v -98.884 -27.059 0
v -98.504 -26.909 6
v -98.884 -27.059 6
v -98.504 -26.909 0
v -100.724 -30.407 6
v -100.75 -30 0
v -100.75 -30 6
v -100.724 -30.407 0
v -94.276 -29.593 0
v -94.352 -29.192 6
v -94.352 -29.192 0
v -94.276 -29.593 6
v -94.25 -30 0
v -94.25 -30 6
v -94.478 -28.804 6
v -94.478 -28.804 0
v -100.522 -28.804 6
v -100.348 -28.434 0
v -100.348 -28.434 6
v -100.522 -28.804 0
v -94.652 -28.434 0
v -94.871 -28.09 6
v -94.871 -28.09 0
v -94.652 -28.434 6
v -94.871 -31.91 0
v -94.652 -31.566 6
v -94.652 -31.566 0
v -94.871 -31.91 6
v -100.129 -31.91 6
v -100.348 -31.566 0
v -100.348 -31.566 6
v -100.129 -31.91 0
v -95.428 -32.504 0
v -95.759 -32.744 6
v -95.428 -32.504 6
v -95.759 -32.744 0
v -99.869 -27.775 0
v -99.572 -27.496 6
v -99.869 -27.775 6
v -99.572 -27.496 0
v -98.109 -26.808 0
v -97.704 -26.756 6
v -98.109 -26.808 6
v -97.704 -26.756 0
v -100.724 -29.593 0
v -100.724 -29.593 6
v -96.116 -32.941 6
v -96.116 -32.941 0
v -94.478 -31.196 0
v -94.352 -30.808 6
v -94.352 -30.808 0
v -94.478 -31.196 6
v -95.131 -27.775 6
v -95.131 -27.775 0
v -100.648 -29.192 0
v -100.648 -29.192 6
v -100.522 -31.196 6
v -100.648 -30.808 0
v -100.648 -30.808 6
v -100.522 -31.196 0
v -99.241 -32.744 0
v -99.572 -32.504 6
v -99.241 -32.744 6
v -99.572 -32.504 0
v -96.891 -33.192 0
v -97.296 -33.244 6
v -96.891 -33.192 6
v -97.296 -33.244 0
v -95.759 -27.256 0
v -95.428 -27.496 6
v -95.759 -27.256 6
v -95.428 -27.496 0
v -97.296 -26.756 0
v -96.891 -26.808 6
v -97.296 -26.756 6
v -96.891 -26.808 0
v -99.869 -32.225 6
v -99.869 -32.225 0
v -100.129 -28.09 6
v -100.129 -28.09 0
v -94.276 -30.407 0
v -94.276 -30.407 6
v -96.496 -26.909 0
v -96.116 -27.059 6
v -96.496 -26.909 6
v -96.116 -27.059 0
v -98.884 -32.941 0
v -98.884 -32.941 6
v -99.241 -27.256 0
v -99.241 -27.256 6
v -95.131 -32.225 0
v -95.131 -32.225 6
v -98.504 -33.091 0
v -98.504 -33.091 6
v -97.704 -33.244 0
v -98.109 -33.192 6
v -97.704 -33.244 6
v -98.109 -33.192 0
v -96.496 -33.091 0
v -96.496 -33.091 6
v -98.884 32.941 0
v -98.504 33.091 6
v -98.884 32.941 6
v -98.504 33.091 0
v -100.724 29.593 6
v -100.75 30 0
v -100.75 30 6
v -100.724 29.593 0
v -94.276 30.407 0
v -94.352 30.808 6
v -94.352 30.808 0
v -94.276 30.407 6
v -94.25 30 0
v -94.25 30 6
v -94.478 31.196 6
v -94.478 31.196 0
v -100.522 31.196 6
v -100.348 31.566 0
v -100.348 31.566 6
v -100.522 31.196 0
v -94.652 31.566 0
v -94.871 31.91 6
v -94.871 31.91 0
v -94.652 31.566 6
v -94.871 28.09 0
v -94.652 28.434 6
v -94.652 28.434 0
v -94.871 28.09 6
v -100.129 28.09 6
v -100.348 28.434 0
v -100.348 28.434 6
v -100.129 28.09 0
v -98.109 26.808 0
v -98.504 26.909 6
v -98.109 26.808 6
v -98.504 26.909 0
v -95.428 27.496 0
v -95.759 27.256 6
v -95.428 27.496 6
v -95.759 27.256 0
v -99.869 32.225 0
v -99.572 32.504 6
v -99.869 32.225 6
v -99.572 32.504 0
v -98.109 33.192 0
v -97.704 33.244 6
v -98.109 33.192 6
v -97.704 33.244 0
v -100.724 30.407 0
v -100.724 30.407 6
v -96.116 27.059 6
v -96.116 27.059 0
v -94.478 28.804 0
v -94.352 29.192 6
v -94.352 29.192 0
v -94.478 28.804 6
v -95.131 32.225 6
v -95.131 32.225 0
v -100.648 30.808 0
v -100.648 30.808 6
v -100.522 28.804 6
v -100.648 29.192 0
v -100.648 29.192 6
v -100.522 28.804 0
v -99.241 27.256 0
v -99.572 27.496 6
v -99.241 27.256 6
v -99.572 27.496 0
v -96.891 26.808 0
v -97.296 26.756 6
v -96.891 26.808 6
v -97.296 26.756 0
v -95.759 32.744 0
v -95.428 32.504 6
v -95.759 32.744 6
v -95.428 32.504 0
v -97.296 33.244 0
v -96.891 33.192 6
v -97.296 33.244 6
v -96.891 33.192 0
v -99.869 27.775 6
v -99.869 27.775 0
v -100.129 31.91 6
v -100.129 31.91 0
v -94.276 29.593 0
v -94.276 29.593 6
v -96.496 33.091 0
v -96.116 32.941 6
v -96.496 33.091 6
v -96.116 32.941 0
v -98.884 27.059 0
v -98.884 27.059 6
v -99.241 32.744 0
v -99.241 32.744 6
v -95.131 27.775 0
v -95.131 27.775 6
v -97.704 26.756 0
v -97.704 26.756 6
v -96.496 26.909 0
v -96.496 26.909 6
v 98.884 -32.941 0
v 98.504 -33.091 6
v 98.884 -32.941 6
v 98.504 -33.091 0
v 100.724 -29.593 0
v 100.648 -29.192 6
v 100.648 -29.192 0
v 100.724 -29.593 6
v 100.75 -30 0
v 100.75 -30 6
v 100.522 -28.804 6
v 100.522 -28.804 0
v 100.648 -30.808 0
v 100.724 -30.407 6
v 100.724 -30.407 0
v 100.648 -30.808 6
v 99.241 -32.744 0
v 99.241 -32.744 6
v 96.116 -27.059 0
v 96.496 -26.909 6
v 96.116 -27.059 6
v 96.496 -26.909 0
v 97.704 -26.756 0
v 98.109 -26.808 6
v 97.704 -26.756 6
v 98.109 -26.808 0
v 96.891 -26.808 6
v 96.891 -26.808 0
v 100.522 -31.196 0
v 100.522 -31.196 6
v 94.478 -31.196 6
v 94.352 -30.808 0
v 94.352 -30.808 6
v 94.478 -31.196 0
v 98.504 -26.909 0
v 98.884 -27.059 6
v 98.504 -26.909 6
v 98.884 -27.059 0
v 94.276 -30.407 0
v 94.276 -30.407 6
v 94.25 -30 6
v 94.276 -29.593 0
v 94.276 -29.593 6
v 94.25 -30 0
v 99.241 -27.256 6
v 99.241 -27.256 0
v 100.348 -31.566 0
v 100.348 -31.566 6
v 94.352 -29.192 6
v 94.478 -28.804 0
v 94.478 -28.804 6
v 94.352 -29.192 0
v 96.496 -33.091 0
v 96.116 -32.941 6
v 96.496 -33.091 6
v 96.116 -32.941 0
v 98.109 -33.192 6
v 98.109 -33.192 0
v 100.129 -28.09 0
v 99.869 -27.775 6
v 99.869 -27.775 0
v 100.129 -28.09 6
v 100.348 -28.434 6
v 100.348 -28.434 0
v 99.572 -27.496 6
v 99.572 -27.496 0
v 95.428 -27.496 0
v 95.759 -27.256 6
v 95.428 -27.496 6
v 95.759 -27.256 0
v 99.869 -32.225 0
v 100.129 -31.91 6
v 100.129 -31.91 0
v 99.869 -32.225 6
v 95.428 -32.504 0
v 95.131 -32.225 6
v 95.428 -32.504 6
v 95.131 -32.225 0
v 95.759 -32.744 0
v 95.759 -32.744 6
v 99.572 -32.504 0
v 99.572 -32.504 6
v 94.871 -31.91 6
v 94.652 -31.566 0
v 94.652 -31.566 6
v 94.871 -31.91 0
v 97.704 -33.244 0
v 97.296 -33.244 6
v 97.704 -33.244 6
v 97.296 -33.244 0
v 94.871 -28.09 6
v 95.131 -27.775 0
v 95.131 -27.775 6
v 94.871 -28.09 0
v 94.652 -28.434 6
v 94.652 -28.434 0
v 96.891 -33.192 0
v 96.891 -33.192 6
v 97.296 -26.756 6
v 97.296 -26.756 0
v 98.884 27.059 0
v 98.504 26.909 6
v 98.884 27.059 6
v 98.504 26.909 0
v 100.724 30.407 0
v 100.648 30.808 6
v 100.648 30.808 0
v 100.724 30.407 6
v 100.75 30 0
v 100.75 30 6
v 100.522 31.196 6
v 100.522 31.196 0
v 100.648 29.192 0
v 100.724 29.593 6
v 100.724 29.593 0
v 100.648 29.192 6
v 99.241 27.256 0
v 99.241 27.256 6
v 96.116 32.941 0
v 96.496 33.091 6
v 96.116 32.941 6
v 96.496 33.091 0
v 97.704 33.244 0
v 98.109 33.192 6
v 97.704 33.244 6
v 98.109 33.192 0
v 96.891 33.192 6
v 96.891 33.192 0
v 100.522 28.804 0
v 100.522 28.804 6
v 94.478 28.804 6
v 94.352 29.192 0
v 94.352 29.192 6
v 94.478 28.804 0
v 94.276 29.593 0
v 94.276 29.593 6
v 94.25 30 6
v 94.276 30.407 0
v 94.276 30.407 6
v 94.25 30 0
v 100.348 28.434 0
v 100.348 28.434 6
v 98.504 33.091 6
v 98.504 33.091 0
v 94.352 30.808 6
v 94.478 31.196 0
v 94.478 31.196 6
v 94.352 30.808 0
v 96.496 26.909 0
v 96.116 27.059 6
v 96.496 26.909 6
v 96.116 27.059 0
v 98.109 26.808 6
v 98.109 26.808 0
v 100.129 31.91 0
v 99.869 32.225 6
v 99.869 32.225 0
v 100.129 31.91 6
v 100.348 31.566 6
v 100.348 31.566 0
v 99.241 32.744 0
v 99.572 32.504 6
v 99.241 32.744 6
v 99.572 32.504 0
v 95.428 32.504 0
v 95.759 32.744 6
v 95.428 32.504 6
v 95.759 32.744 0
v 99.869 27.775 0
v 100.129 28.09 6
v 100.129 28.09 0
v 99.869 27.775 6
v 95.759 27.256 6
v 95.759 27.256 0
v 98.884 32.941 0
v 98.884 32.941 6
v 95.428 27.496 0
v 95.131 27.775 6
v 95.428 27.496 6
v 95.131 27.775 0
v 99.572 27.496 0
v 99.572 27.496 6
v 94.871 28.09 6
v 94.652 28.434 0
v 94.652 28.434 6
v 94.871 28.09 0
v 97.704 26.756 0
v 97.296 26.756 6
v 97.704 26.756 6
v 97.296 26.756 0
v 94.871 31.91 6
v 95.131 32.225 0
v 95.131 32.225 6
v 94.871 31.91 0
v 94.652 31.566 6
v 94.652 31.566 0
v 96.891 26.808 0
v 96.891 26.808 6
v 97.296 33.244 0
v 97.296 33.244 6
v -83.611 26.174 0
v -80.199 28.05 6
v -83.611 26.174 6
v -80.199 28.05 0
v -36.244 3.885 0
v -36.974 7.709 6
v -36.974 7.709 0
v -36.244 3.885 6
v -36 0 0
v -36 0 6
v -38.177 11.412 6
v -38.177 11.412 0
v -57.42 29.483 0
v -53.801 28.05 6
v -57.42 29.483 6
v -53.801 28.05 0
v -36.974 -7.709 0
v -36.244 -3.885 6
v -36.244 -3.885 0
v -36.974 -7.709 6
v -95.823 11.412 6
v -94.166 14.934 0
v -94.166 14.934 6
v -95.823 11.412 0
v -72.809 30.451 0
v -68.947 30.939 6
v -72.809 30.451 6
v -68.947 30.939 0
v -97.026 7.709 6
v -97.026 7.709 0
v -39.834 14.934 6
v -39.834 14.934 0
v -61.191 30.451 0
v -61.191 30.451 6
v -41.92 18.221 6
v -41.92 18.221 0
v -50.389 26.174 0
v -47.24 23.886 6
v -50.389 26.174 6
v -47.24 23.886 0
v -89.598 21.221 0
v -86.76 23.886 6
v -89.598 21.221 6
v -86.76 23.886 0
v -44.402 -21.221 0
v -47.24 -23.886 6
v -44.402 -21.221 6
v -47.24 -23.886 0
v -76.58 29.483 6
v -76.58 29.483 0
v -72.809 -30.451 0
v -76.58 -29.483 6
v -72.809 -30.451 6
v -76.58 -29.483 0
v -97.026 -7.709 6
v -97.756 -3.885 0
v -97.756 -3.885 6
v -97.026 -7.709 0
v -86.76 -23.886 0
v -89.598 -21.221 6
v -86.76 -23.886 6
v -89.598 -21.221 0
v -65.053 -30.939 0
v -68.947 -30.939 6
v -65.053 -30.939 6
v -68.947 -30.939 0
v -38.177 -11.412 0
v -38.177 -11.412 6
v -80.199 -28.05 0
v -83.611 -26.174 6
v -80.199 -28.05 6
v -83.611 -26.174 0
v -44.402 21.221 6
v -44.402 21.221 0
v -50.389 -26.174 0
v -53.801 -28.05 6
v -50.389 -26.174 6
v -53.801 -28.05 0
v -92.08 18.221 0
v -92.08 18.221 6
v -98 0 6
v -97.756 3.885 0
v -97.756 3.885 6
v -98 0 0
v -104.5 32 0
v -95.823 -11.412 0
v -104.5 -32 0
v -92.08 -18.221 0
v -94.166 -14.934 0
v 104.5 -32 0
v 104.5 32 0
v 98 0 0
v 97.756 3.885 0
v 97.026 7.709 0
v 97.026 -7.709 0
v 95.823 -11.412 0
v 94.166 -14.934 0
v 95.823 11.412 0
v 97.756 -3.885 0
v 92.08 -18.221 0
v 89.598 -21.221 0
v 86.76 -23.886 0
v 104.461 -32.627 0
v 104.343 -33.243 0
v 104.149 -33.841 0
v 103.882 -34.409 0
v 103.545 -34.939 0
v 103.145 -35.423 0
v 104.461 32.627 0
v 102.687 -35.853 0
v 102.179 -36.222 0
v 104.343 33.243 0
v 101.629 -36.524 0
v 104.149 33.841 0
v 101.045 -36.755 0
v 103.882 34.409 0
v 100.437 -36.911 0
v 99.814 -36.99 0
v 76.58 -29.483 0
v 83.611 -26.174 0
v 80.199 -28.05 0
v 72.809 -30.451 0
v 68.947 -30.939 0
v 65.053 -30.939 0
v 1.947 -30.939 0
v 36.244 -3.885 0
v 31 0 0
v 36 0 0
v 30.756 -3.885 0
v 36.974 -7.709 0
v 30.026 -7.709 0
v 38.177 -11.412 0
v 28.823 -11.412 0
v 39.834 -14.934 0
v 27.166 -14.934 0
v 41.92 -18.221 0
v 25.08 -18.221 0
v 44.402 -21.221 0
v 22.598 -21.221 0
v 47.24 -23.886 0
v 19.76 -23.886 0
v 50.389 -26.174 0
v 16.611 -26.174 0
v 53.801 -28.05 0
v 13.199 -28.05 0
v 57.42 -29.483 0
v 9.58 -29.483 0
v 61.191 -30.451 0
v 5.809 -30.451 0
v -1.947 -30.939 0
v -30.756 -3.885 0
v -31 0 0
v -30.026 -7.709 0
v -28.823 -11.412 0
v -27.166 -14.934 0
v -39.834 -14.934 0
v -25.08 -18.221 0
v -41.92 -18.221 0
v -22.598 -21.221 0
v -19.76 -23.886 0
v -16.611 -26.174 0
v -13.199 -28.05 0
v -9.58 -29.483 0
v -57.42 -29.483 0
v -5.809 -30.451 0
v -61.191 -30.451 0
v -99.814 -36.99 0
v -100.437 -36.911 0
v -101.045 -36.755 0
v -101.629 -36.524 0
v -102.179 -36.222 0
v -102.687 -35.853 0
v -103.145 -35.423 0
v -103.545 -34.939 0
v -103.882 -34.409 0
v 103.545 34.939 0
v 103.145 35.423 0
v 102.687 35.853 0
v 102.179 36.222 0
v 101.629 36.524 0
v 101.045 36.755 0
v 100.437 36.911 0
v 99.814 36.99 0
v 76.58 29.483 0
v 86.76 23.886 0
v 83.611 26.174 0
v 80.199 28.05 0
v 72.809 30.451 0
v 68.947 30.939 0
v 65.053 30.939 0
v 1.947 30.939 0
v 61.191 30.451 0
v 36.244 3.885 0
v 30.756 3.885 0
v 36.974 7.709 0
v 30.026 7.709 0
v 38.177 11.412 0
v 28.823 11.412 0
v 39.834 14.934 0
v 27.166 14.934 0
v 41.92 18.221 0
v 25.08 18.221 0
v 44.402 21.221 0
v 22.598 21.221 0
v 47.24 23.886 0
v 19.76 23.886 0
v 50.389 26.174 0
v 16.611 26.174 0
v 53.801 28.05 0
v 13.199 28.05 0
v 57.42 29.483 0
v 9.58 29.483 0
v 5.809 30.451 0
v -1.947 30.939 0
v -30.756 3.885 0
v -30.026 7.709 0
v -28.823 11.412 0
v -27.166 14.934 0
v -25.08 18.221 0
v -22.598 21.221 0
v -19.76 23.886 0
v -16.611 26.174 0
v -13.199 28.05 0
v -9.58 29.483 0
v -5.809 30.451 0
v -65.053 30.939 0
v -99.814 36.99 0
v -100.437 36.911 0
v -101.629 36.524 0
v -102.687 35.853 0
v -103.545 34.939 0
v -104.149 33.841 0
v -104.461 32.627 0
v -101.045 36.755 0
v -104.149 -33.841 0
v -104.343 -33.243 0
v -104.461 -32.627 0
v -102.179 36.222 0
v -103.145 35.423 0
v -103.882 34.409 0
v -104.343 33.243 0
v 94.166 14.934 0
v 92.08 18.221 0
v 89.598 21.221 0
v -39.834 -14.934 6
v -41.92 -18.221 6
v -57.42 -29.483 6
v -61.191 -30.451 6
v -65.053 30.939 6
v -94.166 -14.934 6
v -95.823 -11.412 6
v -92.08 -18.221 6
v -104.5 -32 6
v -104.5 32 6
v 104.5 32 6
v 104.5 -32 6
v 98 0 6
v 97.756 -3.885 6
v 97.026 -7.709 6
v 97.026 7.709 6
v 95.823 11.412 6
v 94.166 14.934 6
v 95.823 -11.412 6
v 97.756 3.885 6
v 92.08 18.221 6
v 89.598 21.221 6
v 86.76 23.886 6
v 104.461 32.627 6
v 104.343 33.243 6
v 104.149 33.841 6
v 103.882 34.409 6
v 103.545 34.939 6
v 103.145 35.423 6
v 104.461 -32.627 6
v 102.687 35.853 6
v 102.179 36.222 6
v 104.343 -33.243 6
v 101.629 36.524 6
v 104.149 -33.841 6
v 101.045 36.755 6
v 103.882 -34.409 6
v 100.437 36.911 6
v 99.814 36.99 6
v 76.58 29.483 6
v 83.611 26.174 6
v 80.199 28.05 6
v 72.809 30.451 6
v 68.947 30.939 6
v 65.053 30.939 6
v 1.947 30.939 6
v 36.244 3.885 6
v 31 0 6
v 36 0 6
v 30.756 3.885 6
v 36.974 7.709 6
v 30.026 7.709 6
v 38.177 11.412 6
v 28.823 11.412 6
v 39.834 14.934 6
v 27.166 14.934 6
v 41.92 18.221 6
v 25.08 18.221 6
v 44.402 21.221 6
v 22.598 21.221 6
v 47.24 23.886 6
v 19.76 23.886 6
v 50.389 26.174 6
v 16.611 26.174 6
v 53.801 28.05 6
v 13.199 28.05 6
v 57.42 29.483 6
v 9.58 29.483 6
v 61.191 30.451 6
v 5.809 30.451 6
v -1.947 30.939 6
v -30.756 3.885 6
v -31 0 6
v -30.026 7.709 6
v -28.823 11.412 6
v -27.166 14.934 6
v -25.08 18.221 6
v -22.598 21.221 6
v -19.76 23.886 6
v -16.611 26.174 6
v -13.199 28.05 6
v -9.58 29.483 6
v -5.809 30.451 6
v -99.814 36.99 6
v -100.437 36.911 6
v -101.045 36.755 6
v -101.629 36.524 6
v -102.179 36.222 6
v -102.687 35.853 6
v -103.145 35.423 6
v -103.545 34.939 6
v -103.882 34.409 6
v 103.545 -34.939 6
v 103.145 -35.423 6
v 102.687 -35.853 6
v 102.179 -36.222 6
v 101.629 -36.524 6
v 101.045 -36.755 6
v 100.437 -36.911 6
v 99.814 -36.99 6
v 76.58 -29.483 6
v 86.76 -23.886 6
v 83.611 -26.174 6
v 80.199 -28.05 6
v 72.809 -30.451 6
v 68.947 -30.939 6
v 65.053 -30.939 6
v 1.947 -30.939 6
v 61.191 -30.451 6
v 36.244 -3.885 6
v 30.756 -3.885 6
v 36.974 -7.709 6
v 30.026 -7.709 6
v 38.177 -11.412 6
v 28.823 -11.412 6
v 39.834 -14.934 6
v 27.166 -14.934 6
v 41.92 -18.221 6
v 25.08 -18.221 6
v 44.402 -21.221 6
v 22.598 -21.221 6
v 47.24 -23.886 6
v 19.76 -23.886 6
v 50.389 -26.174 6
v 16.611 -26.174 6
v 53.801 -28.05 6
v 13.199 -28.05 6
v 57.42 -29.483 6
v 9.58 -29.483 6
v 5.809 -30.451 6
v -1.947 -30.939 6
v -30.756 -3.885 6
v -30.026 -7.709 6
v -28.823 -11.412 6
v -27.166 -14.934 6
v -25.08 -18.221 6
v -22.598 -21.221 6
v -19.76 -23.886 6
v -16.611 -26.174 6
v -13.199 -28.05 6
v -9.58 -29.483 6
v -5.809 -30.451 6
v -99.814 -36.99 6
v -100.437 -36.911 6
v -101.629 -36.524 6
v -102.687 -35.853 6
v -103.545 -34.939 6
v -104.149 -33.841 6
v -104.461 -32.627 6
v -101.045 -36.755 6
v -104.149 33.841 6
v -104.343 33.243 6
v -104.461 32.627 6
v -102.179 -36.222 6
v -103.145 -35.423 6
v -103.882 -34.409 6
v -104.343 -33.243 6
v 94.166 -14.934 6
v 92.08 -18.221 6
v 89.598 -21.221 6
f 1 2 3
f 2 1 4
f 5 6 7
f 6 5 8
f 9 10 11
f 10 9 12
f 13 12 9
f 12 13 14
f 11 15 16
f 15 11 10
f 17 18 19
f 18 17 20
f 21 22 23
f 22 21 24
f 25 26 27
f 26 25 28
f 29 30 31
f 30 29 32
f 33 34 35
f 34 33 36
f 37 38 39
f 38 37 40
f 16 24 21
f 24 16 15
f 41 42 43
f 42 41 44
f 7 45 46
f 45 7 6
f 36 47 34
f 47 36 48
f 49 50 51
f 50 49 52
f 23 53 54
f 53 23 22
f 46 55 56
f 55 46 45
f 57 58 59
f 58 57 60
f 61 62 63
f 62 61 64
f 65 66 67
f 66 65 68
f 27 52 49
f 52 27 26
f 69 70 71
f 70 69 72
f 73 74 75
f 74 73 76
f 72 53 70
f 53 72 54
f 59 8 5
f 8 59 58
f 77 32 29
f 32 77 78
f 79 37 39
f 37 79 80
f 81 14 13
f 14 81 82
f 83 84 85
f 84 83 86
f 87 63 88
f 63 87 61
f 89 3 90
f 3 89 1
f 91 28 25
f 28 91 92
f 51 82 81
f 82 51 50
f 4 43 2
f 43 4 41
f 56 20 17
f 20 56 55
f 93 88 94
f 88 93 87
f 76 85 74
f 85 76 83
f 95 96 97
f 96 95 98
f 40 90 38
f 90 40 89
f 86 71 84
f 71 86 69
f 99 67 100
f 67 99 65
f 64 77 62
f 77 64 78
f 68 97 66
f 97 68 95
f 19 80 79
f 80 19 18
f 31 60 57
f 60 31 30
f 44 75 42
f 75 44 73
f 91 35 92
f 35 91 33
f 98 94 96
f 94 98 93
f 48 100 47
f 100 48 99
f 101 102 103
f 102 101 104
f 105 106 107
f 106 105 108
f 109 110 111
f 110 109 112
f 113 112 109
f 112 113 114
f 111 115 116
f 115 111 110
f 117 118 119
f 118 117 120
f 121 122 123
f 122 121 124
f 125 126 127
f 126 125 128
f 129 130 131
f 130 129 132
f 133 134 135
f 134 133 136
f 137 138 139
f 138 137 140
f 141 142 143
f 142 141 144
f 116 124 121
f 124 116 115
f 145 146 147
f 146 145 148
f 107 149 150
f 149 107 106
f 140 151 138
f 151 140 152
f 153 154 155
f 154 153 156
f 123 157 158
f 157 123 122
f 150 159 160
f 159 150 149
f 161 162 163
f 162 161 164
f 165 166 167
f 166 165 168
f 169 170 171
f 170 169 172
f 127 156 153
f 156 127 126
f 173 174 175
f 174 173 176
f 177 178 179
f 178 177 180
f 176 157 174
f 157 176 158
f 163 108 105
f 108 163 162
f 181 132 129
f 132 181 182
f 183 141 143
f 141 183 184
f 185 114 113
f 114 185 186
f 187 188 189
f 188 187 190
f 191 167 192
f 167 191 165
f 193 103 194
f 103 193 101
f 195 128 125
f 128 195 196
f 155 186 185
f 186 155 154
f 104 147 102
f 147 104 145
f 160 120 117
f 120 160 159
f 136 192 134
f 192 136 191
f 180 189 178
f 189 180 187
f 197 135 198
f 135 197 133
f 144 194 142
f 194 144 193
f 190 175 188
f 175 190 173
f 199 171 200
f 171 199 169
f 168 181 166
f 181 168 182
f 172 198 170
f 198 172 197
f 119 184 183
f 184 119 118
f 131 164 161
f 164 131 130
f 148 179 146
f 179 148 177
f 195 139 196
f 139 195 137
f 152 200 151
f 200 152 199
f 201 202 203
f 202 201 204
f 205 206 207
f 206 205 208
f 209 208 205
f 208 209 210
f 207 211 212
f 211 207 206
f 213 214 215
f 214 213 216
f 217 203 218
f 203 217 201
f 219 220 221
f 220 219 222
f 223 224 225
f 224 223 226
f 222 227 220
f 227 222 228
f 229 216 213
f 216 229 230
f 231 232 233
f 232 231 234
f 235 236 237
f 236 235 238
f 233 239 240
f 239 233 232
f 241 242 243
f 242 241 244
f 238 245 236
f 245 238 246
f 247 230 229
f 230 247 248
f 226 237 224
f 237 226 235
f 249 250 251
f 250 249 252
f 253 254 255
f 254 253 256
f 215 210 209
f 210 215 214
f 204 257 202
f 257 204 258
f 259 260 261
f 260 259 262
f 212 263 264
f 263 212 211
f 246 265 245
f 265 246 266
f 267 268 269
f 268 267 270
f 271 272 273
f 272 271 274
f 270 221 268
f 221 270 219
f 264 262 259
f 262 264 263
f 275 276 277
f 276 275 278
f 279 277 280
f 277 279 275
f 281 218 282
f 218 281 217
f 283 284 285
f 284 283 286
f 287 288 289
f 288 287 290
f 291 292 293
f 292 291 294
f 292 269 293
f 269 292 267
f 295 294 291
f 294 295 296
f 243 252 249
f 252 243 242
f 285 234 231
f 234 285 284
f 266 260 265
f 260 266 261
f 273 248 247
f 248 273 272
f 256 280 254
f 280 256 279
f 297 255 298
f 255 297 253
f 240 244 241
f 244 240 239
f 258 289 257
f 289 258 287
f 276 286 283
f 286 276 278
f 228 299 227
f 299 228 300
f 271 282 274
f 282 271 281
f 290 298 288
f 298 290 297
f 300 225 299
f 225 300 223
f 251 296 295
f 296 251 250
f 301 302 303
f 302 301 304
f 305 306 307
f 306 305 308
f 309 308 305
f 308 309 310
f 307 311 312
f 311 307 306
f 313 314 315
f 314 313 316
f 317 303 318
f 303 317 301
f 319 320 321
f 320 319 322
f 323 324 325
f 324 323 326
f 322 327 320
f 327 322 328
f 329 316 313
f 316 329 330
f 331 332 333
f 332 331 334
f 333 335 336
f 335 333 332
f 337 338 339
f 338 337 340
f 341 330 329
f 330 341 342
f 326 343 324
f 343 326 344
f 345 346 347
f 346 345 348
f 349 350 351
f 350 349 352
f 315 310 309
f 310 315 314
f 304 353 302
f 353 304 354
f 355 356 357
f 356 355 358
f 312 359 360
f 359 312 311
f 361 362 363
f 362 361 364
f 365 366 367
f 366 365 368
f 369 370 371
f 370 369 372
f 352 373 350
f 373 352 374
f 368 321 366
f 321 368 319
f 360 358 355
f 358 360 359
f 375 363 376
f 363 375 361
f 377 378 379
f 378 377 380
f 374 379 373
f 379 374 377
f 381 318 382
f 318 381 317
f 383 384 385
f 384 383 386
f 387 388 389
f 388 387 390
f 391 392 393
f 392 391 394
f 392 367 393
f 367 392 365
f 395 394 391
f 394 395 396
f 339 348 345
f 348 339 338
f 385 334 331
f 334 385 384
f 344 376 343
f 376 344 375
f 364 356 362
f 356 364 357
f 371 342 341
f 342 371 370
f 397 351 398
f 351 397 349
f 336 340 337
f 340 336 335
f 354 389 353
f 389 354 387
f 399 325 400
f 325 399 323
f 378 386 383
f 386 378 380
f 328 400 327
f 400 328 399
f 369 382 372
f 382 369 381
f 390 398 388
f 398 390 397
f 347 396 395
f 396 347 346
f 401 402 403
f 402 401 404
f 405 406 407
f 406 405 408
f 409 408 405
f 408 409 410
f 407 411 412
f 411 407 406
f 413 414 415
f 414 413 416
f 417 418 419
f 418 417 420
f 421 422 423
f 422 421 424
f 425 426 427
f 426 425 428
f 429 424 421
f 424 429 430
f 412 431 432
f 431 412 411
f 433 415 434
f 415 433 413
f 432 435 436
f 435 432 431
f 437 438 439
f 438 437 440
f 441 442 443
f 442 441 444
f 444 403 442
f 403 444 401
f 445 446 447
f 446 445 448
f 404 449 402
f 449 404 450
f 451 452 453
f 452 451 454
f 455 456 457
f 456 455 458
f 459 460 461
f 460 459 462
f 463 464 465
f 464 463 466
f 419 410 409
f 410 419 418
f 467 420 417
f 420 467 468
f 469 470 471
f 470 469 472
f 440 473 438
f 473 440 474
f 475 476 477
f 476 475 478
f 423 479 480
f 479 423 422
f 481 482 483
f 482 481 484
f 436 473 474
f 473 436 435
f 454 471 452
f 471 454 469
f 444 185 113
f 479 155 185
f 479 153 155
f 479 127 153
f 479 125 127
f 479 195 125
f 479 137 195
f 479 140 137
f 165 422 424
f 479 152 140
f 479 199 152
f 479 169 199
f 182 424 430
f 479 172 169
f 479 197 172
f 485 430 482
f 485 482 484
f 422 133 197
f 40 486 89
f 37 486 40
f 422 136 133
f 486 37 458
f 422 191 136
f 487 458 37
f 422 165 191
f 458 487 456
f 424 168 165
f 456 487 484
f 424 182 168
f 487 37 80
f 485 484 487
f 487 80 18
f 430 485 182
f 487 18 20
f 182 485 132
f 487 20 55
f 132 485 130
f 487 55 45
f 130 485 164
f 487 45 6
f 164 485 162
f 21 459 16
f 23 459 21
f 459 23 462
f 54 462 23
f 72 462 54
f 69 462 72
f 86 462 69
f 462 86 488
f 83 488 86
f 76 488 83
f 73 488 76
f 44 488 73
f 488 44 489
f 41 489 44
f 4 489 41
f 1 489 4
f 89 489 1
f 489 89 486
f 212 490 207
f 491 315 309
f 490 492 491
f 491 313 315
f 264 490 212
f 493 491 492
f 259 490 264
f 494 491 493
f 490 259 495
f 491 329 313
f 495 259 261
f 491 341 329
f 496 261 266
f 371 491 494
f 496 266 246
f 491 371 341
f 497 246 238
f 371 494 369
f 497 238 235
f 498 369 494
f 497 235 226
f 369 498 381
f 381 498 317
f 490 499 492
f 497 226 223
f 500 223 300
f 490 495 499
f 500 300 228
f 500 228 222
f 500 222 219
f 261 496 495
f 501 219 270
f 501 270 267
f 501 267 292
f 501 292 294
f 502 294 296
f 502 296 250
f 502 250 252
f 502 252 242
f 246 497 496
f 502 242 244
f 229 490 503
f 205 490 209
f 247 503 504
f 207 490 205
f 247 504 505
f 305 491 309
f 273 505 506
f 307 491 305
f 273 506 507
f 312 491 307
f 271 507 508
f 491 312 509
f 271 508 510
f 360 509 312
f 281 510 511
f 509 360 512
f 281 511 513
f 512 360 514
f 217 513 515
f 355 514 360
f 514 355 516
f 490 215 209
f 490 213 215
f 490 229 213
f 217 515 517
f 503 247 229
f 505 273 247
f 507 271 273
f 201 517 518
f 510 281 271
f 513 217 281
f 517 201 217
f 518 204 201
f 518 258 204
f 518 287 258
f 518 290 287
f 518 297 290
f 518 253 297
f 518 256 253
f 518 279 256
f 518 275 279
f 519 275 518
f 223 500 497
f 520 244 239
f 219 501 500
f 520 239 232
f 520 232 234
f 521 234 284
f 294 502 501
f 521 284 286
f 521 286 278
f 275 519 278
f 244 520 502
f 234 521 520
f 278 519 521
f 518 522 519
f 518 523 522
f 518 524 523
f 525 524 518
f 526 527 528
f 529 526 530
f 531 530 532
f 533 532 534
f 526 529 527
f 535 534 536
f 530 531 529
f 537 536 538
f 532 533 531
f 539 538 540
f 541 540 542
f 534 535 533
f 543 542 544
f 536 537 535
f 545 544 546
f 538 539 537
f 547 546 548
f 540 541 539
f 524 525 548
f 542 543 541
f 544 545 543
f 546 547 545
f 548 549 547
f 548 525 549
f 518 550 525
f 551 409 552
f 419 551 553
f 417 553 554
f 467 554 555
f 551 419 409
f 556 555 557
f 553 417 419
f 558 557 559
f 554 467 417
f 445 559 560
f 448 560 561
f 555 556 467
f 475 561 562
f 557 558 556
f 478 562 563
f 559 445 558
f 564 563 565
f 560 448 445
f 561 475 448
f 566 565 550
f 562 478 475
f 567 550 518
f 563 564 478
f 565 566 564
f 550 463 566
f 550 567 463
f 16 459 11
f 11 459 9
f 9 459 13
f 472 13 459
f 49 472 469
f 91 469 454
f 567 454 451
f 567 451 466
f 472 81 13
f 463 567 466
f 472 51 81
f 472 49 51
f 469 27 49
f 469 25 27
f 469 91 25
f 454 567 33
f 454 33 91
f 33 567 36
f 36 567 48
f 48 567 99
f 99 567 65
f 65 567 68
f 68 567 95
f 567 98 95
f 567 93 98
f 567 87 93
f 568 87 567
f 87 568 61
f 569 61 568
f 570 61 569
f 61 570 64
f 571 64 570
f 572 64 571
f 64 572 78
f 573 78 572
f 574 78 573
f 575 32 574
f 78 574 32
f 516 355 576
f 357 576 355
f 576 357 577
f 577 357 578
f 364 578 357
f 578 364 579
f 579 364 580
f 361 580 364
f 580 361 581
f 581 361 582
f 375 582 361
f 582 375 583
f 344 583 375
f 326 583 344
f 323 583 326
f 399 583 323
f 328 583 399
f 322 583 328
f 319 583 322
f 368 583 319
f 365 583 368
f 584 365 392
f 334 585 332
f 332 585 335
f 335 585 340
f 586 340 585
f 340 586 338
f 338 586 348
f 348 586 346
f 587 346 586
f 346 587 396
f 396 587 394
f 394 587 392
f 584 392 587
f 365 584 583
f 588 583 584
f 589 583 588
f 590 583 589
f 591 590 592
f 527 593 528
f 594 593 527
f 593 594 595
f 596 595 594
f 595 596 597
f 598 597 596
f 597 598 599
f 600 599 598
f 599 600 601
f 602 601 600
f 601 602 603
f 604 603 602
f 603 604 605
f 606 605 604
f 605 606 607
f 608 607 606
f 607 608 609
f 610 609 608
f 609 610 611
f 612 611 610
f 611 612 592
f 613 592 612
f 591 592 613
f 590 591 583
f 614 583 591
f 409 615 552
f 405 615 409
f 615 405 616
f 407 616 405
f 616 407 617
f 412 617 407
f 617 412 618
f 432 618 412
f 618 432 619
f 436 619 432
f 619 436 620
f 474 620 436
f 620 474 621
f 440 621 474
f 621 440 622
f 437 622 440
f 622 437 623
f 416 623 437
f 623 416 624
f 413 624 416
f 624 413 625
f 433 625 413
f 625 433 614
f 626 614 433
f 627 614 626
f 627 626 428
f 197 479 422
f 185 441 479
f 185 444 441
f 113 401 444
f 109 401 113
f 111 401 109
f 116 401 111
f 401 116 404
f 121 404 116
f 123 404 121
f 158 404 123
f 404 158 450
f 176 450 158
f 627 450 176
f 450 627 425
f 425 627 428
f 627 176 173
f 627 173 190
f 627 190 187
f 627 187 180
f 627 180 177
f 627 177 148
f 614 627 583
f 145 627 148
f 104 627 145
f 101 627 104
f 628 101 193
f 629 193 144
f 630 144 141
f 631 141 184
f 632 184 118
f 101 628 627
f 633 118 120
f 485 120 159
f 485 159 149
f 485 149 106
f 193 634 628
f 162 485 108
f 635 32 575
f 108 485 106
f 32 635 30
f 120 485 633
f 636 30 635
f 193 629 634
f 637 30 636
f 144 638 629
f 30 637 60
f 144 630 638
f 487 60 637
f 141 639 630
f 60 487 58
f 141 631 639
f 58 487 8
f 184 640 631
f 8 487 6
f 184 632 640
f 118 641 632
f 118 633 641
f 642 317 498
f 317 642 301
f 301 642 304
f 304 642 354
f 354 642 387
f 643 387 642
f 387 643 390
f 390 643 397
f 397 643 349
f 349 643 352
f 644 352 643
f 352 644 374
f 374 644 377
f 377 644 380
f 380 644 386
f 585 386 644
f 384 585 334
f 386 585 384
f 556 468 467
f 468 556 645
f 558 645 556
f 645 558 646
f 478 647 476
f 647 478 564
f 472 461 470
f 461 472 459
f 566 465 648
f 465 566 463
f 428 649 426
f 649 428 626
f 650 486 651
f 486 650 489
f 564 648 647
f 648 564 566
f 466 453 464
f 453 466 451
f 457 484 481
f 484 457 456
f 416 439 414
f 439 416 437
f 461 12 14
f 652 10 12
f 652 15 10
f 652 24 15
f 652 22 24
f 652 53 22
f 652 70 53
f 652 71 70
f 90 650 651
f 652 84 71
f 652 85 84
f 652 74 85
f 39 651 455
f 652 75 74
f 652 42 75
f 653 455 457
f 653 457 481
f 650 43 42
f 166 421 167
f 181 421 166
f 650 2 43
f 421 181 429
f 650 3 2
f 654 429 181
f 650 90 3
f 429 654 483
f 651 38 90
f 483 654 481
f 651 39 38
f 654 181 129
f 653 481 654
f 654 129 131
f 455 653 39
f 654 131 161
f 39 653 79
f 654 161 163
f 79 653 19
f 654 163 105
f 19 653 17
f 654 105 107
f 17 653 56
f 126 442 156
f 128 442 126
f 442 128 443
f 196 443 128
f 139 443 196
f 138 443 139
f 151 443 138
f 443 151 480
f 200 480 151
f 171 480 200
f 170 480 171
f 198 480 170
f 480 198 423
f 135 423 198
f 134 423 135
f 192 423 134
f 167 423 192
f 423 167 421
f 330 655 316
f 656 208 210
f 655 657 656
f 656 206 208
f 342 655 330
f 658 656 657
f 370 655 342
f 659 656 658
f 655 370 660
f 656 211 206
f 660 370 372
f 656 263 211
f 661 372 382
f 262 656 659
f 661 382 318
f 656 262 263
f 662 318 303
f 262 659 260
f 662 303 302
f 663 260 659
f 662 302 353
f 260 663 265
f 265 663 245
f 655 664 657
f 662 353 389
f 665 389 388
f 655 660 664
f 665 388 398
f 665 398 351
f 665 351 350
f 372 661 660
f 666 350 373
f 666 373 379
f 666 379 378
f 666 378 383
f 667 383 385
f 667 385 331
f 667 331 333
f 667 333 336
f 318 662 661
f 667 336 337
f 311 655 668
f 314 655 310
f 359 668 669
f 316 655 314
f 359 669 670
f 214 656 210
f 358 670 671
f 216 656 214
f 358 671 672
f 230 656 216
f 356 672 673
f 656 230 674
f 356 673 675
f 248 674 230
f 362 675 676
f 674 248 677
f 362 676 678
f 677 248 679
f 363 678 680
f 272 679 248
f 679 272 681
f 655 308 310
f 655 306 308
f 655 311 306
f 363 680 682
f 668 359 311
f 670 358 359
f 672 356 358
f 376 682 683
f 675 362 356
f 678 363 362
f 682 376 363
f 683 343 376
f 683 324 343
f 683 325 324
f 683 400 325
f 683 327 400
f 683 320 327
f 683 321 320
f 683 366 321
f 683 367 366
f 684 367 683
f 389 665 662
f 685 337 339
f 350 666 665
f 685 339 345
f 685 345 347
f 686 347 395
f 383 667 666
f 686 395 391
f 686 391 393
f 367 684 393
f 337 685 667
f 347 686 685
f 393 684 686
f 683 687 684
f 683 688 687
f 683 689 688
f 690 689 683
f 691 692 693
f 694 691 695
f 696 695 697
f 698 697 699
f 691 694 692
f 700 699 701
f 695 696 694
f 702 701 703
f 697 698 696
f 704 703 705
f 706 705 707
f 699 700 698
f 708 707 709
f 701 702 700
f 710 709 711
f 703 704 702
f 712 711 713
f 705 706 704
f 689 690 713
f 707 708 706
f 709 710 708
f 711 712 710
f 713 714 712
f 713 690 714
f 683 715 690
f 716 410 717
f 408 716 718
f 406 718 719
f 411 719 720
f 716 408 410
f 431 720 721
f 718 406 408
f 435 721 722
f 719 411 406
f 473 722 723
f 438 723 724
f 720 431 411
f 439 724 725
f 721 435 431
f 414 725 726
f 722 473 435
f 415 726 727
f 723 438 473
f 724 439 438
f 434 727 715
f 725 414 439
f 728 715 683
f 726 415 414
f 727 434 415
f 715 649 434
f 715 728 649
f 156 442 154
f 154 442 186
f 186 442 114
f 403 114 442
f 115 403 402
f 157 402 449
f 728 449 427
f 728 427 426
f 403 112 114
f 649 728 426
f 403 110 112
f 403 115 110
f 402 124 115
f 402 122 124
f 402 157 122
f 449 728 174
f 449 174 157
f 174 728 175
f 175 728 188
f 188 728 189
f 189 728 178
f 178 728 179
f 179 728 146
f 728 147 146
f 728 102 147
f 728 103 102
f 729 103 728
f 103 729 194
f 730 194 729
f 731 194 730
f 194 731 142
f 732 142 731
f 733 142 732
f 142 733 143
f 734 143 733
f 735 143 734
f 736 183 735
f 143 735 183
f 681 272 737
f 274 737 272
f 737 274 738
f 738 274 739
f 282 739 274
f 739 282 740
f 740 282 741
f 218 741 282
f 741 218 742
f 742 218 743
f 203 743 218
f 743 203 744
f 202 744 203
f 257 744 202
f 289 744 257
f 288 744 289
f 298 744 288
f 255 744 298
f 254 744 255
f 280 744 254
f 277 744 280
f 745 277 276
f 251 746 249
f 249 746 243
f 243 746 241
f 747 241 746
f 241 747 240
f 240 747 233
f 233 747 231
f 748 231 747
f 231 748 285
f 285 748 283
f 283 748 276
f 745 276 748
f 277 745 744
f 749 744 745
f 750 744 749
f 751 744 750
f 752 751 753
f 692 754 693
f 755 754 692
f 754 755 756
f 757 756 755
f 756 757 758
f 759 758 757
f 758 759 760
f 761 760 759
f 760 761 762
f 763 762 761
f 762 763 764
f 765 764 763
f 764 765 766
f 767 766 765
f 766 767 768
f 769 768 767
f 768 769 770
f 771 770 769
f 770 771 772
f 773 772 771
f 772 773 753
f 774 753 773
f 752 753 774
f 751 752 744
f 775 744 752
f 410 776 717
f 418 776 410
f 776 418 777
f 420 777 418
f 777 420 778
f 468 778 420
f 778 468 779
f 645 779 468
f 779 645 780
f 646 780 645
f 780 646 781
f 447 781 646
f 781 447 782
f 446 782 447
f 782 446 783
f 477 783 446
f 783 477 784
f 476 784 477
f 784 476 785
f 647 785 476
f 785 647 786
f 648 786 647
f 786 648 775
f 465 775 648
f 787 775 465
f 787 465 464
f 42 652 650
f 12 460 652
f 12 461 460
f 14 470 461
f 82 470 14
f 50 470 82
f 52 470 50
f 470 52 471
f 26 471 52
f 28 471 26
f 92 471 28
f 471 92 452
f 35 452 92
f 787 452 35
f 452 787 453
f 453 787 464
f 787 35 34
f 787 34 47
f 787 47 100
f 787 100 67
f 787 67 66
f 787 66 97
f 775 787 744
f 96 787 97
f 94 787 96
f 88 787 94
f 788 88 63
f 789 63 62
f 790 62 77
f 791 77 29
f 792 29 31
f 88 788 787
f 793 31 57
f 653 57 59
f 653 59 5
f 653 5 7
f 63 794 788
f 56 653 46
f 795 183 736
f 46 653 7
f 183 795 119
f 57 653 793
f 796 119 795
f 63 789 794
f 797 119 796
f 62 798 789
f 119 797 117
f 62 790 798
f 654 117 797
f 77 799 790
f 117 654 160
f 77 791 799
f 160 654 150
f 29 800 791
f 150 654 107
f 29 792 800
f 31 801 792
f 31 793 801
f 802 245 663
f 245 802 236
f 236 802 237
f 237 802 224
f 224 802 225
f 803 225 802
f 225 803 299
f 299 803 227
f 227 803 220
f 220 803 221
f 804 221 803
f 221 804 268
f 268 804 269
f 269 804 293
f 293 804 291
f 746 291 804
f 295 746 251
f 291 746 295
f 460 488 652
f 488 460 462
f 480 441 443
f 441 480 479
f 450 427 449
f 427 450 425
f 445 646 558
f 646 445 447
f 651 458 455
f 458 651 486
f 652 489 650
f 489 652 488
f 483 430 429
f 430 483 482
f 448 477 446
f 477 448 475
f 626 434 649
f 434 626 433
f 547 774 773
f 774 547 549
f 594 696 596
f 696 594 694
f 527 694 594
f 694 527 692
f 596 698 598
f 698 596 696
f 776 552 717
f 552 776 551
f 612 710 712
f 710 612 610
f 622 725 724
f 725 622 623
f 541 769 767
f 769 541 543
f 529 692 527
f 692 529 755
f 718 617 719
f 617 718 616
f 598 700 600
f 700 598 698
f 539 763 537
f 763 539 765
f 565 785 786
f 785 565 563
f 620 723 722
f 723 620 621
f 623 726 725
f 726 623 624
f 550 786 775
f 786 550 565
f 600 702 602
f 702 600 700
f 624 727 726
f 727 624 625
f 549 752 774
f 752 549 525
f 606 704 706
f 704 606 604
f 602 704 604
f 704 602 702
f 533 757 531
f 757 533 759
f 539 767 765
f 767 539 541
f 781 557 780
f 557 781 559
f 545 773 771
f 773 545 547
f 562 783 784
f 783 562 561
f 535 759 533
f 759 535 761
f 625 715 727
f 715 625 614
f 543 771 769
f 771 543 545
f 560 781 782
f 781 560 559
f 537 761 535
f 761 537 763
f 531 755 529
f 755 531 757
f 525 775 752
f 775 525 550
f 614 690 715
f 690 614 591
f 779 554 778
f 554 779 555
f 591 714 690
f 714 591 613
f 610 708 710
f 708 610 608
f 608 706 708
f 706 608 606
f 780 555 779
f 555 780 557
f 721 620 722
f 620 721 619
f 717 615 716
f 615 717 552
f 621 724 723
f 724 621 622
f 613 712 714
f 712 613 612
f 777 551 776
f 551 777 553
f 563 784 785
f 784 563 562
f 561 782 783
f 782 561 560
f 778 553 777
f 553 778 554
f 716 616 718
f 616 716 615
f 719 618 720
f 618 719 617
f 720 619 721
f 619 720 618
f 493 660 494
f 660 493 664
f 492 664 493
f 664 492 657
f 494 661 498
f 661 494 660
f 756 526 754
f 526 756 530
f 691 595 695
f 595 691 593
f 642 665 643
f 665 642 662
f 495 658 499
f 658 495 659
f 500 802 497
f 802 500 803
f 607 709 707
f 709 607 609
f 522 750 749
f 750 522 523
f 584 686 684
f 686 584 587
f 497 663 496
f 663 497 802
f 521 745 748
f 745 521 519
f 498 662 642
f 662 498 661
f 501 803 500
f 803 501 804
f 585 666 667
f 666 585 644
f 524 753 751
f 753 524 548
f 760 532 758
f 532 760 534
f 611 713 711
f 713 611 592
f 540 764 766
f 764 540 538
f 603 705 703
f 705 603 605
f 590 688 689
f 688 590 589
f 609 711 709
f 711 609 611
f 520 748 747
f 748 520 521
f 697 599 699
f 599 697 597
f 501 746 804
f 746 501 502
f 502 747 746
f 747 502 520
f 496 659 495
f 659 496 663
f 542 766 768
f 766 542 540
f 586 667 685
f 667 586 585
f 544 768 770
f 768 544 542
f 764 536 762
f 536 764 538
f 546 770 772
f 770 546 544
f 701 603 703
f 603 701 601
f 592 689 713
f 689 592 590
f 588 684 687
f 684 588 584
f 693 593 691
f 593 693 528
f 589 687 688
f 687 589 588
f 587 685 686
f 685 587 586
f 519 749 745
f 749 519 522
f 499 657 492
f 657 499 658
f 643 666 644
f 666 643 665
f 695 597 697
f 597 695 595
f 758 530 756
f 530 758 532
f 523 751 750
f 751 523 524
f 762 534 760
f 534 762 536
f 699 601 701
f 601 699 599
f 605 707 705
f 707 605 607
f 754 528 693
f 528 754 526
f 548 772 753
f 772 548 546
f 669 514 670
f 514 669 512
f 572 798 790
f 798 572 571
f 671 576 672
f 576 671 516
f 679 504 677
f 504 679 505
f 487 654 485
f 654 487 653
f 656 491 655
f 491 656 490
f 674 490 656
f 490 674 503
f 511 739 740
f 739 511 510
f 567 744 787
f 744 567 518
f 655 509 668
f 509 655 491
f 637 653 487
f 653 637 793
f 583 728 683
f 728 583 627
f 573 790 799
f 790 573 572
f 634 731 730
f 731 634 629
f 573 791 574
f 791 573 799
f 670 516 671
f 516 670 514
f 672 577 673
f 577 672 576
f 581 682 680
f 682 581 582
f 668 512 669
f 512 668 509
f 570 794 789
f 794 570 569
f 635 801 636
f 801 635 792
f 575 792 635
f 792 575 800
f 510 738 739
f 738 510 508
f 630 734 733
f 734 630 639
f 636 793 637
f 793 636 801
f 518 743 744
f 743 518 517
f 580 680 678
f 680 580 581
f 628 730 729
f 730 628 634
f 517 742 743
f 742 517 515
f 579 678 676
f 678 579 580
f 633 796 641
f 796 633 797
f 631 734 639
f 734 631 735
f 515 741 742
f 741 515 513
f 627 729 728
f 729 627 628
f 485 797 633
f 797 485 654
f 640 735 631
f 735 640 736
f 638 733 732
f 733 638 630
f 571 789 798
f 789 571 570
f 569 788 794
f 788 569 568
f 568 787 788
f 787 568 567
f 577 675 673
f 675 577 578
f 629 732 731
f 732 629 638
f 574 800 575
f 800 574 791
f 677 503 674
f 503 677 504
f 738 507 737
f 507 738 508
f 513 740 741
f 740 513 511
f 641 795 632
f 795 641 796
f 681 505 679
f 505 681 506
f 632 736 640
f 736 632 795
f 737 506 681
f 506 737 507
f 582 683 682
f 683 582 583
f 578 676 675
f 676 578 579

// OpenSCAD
$fn = 50;


difference() {
	union() {
		hull() {
			translate(v = [-99.5000000000, 32.0000000000, 0]) {
				cylinder(h = 6, r = 5);
			}
			translate(v = [99.5000000000, 32.0000000000, 0]) {
				cylinder(h = 6, r = 5);
			}
			translate(v = [-99.5000000000, -32.0000000000, 0]) {
				cylinder(h = 6, r = 5);
			}
			translate(v = [99.5000000000, -32.0000000000, 0]) {
				cylinder(h = 6, r = 5);
			}
		}
	}
	union() {
		#translate(v = [-97.5000000000, -30.0000000000, -100.0000000000]) {
			cylinder(h = 200, r = 3.2500000000);
		}
		#translate(v = [-97.5000000000, 30.0000000000, -100.0000000000]) {
			cylinder(h = 200, r = 3.2500000000);
		}
		#translate(v = [97.5000000000, -30.0000000000, -100.0000000000]) {
			cylinder(h = 200, r = 3.2500000000);
		}
		#translate(v = [97.5000000000, 30.0000000000, -100.0000000000]) {
			cylinder(h = 200, r = 3.2500000000);
		}
		#translate(v = [-67.0000000000, 0, 0]) {
			cylinder(h = 6, r = 31.0000000000);
		}
		#cylinder(h = 6, r = 31.0000000000);
		#translate(v = [67.0000000000, 0, 0]) {
			cylinder(h = 6, r = 31.0000000000);
		}
	}
}
